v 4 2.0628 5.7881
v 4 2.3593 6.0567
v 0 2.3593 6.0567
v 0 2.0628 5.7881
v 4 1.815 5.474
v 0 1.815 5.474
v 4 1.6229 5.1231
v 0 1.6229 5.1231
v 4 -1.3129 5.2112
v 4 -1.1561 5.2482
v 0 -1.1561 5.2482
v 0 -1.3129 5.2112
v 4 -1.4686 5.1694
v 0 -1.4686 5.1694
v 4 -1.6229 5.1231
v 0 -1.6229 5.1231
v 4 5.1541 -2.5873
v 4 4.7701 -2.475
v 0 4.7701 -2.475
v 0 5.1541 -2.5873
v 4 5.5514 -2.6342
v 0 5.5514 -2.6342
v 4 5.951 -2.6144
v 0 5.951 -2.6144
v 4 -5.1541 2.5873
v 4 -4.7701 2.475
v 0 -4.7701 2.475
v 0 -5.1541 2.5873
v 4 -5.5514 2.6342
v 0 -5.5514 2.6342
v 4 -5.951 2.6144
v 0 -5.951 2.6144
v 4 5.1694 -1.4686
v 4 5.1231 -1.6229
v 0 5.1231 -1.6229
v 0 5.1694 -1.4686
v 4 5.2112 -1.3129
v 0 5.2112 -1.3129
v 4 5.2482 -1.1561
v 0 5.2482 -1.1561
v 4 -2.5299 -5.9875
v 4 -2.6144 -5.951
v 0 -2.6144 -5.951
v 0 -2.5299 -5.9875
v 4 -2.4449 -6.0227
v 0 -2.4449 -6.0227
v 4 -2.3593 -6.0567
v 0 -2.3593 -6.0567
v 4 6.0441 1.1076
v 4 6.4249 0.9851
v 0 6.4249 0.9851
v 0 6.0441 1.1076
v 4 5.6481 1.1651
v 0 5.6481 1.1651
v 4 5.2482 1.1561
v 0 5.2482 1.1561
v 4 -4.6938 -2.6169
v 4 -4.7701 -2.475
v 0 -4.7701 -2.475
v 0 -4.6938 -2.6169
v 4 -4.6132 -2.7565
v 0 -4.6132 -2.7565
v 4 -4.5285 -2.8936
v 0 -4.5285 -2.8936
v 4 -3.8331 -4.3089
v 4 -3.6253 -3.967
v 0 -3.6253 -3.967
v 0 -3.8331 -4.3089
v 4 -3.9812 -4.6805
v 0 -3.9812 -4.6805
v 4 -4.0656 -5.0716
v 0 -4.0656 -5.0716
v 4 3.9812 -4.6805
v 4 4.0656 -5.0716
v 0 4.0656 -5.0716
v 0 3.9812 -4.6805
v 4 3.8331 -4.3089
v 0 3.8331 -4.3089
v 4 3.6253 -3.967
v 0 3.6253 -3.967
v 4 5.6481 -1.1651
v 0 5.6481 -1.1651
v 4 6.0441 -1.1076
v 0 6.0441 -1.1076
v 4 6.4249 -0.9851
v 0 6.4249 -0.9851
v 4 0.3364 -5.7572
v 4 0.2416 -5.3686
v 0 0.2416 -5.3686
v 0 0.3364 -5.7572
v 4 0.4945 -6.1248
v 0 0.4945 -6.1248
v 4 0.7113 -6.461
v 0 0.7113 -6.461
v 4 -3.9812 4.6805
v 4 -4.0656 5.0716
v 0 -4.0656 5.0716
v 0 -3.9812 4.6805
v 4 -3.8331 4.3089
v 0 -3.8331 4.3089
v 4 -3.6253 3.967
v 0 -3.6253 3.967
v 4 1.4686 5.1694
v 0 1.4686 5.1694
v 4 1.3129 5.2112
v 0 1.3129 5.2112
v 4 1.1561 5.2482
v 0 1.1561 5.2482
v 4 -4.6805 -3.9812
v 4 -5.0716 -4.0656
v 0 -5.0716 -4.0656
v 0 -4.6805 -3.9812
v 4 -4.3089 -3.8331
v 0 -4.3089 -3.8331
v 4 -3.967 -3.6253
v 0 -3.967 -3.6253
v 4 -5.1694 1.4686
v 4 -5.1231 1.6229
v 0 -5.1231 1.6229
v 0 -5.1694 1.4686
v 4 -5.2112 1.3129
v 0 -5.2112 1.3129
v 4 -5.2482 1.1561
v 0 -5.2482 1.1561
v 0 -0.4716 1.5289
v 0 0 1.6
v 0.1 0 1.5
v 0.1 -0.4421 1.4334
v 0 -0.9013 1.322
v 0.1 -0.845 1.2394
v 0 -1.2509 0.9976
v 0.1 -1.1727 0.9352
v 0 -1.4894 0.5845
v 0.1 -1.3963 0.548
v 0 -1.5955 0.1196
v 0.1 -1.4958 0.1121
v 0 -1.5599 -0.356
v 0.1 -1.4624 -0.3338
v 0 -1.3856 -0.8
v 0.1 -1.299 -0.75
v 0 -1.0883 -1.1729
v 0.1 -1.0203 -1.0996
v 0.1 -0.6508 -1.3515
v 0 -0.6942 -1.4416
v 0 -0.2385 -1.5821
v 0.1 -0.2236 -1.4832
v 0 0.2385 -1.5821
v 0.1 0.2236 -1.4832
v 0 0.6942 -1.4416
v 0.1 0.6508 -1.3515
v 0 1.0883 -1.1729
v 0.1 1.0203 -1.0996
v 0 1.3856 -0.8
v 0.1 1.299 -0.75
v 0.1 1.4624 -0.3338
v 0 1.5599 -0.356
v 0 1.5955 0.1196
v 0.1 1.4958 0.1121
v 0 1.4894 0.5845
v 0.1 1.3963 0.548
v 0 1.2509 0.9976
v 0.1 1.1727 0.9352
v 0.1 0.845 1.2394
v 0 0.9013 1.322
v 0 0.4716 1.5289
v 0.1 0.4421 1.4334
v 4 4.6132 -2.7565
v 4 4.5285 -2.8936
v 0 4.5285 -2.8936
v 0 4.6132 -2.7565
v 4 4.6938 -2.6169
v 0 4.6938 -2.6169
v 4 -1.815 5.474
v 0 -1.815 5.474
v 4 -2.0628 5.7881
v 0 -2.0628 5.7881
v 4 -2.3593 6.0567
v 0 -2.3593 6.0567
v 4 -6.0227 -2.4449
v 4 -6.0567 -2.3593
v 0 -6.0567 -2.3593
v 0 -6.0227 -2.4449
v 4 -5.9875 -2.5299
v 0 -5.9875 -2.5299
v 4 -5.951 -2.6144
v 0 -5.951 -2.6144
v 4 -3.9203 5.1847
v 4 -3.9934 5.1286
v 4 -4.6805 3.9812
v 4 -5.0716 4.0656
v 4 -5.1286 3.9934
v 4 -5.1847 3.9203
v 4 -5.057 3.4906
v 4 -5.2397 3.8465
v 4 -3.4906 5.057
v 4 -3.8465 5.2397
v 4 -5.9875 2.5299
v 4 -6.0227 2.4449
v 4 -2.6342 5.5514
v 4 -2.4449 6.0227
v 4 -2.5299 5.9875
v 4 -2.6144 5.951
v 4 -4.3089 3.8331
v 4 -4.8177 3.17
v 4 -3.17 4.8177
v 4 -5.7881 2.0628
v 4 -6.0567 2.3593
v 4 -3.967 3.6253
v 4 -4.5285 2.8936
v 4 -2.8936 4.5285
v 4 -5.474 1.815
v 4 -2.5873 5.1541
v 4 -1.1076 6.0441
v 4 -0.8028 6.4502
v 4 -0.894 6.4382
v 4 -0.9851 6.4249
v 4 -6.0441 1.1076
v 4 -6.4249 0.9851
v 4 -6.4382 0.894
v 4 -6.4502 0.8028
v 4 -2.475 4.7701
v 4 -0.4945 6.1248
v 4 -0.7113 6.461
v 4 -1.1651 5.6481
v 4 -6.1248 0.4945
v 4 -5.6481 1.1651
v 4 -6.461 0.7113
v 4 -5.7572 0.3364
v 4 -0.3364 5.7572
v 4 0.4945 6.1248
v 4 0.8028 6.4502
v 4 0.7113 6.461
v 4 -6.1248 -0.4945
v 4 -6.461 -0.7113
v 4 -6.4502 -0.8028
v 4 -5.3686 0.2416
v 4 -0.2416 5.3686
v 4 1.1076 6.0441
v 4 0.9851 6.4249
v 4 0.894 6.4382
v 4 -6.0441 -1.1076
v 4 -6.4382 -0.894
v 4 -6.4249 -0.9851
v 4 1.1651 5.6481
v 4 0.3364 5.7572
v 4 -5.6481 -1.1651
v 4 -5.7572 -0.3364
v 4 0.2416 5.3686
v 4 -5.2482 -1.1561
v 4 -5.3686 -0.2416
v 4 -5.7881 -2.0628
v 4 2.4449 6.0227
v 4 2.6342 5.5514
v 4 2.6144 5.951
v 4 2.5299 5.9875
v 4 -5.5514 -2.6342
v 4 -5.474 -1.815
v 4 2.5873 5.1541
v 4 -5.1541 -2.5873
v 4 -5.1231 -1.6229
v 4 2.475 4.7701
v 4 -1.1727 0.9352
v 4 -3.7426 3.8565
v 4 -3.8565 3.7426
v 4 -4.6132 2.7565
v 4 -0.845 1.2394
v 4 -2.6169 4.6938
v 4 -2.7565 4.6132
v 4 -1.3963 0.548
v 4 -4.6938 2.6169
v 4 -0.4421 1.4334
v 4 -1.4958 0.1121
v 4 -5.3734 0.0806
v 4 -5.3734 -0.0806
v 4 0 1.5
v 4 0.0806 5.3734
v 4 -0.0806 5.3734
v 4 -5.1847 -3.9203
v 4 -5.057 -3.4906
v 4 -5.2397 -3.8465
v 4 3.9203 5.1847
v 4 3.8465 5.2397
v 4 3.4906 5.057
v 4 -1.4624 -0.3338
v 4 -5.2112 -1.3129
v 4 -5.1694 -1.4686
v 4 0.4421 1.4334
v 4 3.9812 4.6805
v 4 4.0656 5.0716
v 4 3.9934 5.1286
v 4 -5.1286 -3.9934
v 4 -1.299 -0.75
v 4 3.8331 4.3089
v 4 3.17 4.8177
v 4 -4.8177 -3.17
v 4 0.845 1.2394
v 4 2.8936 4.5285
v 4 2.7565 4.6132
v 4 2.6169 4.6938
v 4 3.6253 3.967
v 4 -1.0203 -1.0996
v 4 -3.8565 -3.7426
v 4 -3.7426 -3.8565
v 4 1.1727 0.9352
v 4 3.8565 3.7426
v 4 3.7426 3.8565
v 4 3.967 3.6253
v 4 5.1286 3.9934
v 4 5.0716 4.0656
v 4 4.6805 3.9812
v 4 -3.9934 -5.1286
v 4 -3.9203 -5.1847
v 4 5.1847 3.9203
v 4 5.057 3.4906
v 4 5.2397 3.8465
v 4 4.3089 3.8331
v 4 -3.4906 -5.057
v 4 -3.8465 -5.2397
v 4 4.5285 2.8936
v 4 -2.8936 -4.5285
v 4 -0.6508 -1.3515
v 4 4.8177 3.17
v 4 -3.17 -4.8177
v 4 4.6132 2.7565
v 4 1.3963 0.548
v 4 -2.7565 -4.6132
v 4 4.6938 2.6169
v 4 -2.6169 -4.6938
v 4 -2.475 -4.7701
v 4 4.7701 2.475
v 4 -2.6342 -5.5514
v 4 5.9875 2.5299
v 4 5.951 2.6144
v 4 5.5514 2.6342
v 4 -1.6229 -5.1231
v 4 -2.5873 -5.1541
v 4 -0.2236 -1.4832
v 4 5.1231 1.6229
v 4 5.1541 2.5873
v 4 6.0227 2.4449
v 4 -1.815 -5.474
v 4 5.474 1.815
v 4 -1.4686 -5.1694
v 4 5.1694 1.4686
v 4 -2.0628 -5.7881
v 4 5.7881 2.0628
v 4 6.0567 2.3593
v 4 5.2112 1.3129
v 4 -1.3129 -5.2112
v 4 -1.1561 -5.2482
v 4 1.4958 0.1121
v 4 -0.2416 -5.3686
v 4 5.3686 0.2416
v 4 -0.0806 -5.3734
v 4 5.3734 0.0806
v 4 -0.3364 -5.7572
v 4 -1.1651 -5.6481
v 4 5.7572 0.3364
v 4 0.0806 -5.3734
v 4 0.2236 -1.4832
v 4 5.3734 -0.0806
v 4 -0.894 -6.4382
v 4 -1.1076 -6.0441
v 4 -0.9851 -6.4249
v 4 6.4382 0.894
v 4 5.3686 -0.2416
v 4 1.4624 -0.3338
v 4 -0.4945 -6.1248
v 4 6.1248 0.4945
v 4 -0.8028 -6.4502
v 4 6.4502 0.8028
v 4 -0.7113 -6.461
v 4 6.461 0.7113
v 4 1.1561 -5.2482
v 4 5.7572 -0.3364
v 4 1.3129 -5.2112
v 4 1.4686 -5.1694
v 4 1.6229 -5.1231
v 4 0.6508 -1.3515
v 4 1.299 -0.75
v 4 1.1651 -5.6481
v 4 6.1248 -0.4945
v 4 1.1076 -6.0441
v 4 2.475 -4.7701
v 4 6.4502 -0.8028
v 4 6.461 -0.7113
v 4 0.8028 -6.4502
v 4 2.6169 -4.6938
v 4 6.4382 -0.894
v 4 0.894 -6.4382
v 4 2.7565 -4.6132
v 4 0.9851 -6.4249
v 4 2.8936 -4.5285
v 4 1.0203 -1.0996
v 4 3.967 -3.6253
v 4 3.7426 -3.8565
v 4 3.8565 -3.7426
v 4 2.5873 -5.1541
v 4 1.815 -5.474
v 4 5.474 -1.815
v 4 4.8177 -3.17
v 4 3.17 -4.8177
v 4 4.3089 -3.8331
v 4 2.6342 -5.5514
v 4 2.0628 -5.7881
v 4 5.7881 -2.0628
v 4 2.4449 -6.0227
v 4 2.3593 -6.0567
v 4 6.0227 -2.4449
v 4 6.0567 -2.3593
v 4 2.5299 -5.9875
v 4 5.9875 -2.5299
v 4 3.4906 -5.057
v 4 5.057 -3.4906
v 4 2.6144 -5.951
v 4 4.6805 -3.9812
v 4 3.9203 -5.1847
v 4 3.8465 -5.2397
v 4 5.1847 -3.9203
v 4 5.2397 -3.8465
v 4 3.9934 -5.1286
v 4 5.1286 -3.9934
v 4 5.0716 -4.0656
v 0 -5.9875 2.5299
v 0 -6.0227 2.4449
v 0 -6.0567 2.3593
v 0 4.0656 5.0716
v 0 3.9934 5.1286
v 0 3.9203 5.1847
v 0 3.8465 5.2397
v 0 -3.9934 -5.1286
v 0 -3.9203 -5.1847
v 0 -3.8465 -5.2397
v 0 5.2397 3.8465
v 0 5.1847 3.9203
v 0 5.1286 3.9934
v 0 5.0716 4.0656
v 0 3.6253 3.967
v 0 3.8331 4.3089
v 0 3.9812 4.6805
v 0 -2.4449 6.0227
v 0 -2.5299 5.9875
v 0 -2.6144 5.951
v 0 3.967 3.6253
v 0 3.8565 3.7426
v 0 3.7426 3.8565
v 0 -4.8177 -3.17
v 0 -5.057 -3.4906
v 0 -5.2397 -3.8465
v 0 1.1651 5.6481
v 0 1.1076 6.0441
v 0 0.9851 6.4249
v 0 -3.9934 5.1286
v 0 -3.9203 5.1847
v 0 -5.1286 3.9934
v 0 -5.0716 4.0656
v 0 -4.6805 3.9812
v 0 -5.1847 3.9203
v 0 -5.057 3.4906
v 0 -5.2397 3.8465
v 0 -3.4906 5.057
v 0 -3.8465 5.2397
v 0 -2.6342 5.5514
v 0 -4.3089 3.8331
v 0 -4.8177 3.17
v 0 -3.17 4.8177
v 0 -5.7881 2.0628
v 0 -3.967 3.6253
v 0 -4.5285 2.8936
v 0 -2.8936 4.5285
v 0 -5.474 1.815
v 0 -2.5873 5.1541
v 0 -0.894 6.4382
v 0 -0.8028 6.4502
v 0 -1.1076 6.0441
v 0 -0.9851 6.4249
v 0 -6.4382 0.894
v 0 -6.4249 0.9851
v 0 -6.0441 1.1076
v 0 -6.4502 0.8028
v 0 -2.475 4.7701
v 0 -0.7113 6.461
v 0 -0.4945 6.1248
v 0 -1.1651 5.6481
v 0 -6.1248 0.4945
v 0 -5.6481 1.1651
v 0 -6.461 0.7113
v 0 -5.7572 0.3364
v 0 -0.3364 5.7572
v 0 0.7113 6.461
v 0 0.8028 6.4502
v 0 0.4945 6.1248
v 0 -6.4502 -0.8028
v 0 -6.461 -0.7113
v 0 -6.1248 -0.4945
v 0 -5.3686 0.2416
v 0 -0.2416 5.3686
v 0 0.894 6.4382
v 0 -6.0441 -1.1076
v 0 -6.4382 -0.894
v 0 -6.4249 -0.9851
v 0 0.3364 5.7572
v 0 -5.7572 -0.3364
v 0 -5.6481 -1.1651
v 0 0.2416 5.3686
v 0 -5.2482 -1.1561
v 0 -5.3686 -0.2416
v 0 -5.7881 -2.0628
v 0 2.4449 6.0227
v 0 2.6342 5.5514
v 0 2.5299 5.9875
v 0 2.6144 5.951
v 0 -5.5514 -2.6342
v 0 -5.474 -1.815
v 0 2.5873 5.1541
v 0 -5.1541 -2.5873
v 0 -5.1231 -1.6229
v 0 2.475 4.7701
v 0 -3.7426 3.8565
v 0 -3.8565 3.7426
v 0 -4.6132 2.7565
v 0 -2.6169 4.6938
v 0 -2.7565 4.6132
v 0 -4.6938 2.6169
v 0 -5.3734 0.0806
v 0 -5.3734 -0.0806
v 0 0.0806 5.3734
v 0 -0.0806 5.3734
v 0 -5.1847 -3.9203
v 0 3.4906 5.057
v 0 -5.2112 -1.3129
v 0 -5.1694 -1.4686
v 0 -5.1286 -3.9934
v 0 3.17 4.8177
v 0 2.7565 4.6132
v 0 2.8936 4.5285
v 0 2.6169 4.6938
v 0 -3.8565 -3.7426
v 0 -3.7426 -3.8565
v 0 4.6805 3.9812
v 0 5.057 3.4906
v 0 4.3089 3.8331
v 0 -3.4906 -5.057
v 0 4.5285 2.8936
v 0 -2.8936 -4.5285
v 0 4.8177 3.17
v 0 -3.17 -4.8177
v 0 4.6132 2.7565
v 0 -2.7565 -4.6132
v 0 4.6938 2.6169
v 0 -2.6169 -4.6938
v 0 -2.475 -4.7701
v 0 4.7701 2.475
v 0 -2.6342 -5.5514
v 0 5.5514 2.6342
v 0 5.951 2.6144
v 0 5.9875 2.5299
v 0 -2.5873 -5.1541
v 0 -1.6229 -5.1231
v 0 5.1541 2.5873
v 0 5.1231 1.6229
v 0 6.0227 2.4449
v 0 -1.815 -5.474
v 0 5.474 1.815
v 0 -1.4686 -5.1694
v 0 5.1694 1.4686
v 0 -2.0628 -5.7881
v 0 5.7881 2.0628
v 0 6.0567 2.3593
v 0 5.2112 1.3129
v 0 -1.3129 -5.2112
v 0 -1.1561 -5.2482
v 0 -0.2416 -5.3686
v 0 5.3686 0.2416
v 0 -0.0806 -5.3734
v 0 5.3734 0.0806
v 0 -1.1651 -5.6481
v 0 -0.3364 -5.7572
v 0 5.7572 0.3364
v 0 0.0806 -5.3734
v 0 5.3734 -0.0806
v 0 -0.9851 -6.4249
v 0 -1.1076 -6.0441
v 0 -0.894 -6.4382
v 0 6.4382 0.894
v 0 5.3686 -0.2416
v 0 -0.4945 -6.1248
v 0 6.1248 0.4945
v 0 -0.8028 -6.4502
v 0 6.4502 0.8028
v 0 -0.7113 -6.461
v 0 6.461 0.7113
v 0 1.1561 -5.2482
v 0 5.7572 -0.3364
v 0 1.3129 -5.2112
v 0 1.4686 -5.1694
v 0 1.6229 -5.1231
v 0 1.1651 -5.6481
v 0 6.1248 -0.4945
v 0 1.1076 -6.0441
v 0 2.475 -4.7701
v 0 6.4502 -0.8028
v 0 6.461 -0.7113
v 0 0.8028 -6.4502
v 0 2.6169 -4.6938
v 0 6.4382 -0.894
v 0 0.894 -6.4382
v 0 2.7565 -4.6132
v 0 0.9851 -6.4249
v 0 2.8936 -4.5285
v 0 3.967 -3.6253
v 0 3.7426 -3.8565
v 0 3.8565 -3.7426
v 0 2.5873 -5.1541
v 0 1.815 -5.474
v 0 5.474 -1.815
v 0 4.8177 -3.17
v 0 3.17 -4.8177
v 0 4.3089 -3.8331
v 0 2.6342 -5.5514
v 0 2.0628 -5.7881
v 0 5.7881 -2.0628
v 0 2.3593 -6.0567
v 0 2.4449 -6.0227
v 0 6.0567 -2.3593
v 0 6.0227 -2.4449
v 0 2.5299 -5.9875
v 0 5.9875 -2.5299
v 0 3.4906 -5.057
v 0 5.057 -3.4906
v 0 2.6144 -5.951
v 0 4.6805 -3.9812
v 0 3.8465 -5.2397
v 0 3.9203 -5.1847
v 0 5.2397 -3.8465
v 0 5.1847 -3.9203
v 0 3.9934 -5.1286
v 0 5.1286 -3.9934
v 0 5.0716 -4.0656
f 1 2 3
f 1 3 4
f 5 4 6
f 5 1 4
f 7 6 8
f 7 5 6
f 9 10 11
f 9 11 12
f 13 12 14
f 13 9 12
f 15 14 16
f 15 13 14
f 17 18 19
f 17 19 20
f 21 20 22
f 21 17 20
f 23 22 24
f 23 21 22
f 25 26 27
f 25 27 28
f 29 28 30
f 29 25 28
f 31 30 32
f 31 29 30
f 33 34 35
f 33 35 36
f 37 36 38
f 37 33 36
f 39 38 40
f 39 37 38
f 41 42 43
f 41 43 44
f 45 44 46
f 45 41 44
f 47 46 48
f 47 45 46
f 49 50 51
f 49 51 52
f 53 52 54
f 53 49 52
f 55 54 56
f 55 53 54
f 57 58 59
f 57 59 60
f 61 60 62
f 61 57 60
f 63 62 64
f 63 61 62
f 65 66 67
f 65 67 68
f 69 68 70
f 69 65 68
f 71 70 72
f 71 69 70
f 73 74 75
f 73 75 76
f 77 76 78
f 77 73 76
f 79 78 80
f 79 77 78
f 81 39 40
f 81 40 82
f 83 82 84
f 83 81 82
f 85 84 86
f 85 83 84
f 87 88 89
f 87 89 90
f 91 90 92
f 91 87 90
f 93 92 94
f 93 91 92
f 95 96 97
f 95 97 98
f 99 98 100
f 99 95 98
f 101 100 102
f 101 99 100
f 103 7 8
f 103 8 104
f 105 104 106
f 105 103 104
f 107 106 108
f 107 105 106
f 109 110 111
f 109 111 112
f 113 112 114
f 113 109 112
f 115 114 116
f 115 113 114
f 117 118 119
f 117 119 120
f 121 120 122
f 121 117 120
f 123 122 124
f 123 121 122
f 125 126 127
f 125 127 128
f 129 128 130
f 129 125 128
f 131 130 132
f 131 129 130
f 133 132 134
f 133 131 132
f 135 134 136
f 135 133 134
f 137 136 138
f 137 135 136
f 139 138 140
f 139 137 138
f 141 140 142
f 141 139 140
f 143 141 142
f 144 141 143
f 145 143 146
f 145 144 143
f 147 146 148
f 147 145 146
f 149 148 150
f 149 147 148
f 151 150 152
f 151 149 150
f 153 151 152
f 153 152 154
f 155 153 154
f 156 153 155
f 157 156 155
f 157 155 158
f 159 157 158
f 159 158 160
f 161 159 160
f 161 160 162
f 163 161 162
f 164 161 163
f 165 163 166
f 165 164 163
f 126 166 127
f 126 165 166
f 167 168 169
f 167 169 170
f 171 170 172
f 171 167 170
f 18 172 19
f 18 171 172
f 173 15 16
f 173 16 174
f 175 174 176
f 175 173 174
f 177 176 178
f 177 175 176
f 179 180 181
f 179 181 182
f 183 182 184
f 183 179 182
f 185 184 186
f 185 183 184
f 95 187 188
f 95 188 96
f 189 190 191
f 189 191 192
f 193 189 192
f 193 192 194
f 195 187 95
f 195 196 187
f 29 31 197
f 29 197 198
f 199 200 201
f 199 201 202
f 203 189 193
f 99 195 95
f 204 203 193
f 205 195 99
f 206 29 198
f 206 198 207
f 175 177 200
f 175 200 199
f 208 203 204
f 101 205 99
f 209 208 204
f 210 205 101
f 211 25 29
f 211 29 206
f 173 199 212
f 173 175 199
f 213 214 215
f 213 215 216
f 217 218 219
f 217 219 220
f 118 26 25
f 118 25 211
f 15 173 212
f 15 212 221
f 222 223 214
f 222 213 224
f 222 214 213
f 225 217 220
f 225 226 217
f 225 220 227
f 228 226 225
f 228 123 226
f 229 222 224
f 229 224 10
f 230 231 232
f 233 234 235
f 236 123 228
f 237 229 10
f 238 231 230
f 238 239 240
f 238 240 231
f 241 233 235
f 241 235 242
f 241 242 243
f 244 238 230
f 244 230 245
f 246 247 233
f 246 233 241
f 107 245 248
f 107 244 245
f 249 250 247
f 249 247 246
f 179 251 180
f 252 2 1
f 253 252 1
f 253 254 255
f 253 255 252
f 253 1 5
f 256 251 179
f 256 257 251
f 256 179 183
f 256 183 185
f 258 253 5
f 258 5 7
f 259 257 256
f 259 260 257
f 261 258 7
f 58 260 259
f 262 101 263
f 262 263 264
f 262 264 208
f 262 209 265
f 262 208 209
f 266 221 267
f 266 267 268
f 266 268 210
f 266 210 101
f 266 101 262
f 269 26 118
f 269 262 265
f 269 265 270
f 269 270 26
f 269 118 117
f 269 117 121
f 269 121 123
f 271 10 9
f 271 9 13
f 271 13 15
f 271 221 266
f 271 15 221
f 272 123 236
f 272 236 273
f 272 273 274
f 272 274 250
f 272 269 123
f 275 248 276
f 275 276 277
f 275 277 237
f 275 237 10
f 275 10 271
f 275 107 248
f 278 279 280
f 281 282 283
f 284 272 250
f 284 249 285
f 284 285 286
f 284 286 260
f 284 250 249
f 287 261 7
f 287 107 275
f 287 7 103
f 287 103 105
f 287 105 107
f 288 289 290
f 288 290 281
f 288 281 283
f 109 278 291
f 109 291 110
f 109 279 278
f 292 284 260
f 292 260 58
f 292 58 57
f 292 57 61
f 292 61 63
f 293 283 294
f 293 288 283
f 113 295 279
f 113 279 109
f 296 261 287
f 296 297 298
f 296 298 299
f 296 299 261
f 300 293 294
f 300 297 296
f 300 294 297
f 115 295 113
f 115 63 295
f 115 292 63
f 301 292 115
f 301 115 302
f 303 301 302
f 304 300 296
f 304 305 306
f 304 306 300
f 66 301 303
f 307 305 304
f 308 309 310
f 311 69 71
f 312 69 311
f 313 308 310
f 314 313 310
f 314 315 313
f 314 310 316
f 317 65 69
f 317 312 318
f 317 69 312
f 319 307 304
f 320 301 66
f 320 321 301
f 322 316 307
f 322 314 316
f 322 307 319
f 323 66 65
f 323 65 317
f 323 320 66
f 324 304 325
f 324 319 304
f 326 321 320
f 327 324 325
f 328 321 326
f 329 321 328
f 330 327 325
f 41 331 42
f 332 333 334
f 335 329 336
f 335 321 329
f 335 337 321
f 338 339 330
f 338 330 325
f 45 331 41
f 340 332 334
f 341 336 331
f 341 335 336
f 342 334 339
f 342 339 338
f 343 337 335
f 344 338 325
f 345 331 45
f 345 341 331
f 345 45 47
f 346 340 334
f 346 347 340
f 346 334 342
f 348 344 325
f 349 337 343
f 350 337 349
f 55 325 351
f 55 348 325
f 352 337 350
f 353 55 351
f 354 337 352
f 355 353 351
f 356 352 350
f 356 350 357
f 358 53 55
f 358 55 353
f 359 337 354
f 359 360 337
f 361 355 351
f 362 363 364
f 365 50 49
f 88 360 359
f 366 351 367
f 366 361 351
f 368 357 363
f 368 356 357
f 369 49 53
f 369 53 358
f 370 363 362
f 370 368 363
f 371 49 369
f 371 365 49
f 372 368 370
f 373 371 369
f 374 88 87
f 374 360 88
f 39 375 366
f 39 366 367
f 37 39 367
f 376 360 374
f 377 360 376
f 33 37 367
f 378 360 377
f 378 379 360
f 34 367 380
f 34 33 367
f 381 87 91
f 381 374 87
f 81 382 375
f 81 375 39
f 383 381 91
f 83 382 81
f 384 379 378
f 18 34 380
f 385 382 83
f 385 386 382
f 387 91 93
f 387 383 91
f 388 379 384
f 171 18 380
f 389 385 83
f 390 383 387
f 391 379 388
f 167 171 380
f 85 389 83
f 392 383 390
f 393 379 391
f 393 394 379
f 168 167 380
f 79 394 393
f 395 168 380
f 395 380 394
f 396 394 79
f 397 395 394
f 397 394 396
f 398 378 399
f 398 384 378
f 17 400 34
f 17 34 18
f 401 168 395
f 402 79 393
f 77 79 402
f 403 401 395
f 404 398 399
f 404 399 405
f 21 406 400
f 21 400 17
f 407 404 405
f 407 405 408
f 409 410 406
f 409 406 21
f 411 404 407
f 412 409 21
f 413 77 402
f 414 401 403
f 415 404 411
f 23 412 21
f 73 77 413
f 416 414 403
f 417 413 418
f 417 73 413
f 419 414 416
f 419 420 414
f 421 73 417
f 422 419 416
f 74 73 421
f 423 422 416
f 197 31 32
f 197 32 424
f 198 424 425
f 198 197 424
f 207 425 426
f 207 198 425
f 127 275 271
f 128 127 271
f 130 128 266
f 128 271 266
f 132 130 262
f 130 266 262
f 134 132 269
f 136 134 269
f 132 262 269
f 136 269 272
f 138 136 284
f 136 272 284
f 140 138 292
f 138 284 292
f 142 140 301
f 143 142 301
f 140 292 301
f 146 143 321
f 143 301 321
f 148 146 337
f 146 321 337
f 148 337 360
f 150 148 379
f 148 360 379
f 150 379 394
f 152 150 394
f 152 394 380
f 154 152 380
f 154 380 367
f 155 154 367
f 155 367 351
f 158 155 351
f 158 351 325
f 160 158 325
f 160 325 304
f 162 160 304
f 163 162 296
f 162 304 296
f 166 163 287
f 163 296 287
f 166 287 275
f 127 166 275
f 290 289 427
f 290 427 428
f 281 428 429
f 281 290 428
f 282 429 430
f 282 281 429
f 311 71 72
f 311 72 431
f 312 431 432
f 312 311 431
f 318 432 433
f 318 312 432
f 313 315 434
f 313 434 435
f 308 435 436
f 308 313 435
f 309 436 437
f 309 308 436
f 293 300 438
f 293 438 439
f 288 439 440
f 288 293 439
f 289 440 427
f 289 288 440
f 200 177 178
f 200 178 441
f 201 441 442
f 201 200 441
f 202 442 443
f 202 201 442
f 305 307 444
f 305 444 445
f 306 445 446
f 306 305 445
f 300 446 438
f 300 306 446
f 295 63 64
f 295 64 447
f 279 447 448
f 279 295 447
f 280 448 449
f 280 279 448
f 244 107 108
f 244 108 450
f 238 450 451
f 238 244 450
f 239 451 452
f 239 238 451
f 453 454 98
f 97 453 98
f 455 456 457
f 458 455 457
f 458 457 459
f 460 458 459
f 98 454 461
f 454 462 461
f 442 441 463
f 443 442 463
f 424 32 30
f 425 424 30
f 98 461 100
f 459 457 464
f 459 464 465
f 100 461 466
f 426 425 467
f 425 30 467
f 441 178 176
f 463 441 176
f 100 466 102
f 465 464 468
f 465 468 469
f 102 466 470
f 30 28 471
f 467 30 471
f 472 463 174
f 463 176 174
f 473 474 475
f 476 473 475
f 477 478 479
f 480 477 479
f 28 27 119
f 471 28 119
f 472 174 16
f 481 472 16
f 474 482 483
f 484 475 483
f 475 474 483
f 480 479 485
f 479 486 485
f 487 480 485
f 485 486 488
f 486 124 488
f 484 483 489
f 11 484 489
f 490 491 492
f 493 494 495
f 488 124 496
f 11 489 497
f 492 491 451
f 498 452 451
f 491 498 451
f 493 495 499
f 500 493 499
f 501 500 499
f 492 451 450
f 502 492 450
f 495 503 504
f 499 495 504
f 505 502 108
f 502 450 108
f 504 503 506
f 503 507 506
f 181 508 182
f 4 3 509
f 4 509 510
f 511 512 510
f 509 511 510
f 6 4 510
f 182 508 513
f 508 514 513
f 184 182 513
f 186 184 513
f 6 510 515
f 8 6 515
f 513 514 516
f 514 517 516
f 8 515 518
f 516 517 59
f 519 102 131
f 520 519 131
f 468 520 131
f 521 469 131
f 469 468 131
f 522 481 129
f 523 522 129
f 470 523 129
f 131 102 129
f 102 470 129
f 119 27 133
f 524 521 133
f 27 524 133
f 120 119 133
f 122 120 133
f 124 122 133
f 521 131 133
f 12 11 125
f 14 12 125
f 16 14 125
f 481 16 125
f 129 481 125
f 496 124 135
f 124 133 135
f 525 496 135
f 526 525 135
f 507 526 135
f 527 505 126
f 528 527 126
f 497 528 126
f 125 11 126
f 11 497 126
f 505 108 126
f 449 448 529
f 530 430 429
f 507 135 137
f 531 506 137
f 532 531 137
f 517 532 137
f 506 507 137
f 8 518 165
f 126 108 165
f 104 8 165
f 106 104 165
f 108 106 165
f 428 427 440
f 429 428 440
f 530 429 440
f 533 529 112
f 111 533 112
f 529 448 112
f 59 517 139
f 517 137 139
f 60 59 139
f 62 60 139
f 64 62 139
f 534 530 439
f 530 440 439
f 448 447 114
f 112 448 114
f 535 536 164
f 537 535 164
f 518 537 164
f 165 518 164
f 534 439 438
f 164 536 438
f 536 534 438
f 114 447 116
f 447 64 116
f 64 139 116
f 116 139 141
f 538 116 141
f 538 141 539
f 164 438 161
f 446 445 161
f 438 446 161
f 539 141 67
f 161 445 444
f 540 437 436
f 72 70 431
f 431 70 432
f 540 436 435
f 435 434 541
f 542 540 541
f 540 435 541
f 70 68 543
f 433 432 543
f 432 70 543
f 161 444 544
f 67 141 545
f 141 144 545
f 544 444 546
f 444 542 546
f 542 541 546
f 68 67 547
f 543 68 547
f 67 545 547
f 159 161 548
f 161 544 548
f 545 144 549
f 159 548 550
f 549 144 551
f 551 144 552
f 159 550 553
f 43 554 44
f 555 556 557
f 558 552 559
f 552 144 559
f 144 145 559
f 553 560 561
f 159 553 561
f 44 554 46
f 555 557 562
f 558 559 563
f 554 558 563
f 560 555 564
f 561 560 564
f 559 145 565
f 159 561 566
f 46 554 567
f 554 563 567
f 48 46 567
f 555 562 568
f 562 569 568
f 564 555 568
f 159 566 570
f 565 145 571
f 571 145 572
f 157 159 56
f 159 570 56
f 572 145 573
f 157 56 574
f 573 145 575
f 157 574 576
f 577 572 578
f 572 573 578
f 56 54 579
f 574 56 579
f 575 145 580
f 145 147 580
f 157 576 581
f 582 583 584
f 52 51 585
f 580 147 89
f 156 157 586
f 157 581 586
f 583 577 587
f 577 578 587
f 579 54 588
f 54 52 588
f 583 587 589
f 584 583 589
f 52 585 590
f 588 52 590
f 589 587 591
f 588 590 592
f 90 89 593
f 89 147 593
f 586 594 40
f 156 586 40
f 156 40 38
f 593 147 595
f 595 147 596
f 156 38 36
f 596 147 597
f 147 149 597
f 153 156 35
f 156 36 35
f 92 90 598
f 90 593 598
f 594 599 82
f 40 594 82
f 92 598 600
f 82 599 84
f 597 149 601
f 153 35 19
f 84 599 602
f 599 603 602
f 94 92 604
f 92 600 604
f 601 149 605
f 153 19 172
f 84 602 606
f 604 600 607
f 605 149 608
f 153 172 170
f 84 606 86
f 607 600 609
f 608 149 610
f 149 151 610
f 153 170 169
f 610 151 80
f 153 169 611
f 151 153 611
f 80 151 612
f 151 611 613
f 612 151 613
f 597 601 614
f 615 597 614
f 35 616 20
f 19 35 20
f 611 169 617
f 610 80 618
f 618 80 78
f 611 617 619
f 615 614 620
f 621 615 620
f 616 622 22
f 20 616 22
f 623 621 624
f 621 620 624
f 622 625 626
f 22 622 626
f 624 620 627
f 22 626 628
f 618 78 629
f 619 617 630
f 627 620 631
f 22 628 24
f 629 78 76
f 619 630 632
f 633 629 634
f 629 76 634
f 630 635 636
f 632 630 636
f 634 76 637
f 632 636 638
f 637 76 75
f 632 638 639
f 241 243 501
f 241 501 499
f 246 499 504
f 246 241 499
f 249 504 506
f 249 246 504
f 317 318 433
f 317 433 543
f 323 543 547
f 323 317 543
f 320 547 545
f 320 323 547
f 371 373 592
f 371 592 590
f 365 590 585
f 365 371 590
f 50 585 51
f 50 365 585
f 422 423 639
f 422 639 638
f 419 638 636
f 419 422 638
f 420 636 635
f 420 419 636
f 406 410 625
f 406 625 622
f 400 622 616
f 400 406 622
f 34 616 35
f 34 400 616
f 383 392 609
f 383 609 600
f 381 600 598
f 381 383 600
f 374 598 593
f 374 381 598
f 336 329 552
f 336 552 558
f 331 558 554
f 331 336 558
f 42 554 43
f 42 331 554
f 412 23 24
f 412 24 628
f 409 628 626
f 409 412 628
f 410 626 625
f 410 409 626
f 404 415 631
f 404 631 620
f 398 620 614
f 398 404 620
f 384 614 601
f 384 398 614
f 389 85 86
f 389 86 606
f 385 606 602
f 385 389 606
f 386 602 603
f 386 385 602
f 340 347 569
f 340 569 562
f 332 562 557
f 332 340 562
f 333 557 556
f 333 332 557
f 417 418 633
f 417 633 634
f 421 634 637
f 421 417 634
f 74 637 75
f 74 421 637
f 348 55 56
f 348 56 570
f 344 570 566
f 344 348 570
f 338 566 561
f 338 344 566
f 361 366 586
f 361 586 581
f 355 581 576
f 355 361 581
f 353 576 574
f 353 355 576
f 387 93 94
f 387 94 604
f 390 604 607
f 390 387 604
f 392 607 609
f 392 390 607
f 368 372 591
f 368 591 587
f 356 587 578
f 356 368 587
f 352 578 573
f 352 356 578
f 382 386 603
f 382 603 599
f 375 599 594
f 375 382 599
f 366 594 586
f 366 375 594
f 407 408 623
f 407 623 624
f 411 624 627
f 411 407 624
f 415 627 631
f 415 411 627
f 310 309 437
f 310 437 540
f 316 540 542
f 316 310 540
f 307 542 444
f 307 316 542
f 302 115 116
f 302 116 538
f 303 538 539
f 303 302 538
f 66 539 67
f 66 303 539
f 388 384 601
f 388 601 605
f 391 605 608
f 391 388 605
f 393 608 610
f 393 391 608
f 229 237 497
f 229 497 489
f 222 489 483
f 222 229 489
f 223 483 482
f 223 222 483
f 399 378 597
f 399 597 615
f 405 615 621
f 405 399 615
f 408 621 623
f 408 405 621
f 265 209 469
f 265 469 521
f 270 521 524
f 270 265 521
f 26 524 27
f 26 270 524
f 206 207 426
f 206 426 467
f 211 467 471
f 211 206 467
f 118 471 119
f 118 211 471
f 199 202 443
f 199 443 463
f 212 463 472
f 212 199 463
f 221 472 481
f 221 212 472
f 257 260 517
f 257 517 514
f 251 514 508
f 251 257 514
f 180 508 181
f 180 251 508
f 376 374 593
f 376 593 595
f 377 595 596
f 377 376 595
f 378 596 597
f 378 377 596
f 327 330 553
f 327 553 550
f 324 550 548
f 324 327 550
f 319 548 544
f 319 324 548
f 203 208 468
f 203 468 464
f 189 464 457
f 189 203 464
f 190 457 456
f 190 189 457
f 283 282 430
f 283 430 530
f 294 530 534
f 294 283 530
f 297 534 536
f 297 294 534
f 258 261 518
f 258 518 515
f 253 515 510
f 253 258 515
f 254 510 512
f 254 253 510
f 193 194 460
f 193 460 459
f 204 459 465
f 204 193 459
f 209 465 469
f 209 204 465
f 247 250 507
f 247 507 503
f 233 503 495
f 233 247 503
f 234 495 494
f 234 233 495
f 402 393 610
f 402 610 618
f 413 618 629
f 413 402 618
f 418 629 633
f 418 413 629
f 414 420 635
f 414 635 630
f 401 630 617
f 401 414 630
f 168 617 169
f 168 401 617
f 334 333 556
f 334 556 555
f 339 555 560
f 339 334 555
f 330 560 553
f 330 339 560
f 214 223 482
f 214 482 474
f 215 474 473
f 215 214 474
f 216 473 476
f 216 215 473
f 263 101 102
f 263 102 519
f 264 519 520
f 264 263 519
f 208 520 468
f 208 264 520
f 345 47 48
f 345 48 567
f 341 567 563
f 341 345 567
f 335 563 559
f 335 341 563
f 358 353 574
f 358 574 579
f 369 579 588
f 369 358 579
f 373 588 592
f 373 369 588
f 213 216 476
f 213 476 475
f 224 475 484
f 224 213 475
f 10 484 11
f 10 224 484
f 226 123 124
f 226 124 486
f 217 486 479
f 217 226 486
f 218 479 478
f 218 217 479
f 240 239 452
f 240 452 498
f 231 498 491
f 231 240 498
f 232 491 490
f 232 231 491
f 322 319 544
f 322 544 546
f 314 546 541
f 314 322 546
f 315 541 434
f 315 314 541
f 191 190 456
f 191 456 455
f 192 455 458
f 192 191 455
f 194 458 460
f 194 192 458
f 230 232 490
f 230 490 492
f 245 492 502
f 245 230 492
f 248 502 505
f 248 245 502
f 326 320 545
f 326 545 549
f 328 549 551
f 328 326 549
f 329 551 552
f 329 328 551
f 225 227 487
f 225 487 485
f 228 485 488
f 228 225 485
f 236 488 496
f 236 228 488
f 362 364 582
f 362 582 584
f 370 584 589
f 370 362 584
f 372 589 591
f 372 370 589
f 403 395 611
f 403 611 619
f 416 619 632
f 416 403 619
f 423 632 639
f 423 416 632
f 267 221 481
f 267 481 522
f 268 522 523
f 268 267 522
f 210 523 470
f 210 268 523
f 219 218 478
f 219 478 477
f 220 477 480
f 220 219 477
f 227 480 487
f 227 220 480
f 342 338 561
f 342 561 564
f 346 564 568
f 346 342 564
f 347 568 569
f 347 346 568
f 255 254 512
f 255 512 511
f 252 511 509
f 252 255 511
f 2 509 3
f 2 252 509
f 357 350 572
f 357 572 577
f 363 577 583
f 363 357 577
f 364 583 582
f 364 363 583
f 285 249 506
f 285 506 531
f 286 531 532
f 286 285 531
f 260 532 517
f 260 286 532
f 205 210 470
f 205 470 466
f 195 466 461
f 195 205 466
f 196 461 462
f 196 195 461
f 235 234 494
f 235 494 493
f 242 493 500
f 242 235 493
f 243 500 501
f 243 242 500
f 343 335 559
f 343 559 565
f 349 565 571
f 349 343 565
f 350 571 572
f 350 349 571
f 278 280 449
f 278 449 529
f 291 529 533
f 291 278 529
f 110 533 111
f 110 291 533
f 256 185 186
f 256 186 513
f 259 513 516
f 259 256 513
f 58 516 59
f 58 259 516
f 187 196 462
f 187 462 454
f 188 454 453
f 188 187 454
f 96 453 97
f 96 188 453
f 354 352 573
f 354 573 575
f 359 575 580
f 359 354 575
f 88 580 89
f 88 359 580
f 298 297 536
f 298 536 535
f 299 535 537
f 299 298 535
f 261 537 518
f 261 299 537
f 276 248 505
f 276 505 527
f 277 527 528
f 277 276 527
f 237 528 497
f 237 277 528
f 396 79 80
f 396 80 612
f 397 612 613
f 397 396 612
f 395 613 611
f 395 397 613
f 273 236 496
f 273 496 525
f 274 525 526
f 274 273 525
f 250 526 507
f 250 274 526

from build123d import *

# Parameters (mm, degrees)
SKETCH_1_R      = 1.5
EXTRUDE_1_DEPTH = 4
CHAMFER_1_SIZE  = 0.1


with BuildPart() as part:
    # 草图1 → 凸台-拉伸1 (new body)
    with BuildSketch(Plane(origin=(4, 0, 0), x_dir=(0, 0, -1), z_dir=(1, 0, 0))):
        with BuildLine():
            ThreePointArc((-5.368564348, 0.241646108), (-5.374, 0), (-5.368564348, -0.241646108))
            ThreePointArc((-5.368564348, -0.241646108), (-5.94431135, -0.407766737), (-6.460959589, -0.711337602))
            ThreePointArc((-6.460959589, -0.711337602), (-6.444391599, -0.848420249), (-6.424915449, -0.98512003))
            ThreePointArc((-6.424915449, -0.98512003), (-5.84730165, -1.144628565), (-5.248177569, -1.156074481))
            ThreePointArc((-5.248177569, -1.156074481), (-5.19088539, -1.390893548), (-5.123092339, -1.622898915))
            ThreePointArc((-5.123092339, -1.622898915), (-5.636226055, -1.93237341), (-6.056700011, -2.359318752))
            ThreePointArc((-6.056700011, -2.359318752), (-6.005216961, -2.48744231), (-5.951023938, -2.614443361))
            ThreePointArc((-5.951023938, -2.614443361), (-5.351808006, -2.619019322), (-4.770136161, -2.475010506))
            ThreePointArc((-4.770136161, -2.475010506), (-4.65402052, -2.687), (-4.528490053, -2.893553842))
            ThreePointArc((-4.528490053, -2.893553842), (-4.944041268, -3.325292028), (-5.239686336, -3.846516229))
            ThreePointArc((-5.239686336, -3.846516229), (-5.156796712, -3.956949289), (-5.071579981, -4.065596697))
            ThreePointArc((-5.071579981, -4.065596697), (-4.49159749, -3.91492824), (-3.967017857, -3.625278654))
            ThreePointArc((-3.967017857, -3.625278654), (-3.799991842, -3.799991842), (-3.625278654, -3.967017857))
            ThreePointArc((-3.625278654, -3.967017857), (-3.91492824, -4.49159749), (-4.065596697, -5.071579981))
            ThreePointArc((-4.065596697, -5.071579981), (-3.956949289, -5.156796712), (-3.846516229, -5.239686336))
            ThreePointArc((-3.846516229, -5.239686336), (-3.325292028, -4.944041268), (-2.893553842, -4.528490053))
            ThreePointArc((-2.893553842, -4.528490053), (-2.687, -4.65402052), (-2.475010506, -4.770136161))
            ThreePointArc((-2.475010506, -4.770136161), (-2.619019322, -5.351808006), (-2.614443361, -5.951023938))
            ThreePointArc((-2.614443361, -5.951023938), (-2.48744231, -6.005216961), (-2.359318752, -6.056700011))
            ThreePointArc((-2.359318752, -6.056700011), (-1.93237341, -5.636226055), (-1.622898915, -5.123092339))
            ThreePointArc((-1.622898915, -5.123092339), (-1.390893548, -5.19088539), (-1.156074481, -5.248177569))
            ThreePointArc((-1.156074481, -5.248177569), (-1.144628565, -5.84730165), (-0.98512003, -6.424915449))
            ThreePointArc((-0.98512003, -6.424915449), (-0.848420249, -6.444391599), (-0.711337602, -6.460959589))
            ThreePointArc((-0.711337602, -6.460959589), (-0.407766737, -5.94431135), (-0.241646108, -5.368564348))
            ThreePointArc((-0.241646108, -5.368564348), (0, -5.374), (0.241646108, -5.368564348))
            ThreePointArc((0.241646108, -5.368564348), (0.407766737, -5.94431135), (0.711337602, -6.460959589))
            ThreePointArc((0.711337602, -6.460959589), (0.848420249, -6.444391599), (0.98512003, -6.424915449))
            ThreePointArc((0.98512003, -6.424915449), (1.144628565, -5.84730165), (1.156074481, -5.248177569))
            ThreePointArc((1.156074481, -5.248177569), (1.390893548, -5.19088539), (1.622898915, -5.123092339))
            ThreePointArc((1.622898915, -5.123092339), (1.93237341, -5.636226055), (2.359318752, -6.056700011))
            ThreePointArc((2.359318752, -6.056700011), (2.48744231, -6.005216961), (2.614443361, -5.951023938))
            ThreePointArc((2.614443361, -5.951023938), (2.619019322, -5.351808006), (2.475010506, -4.770136161))
            ThreePointArc((2.475010506, -4.770136161), (2.687, -4.65402052), (2.893553842, -4.528490053))
            ThreePointArc((2.893553842, -4.528490053), (3.325292028, -4.944041268), (3.846516229, -5.239686336))
            ThreePointArc((3.846516229, -5.239686336), (3.956949289, -5.156796712), (4.065596697, -5.071579981))
            ThreePointArc((4.065596697, -5.071579981), (3.91492824, -4.49159749), (3.625278654, -3.967017857))
            ThreePointArc((3.625278654, -3.967017857), (3.799991842, -3.799991842), (3.967017857, -3.625278654))
            ThreePointArc((3.967017857, -3.625278654), (4.49159749, -3.91492824), (5.071579981, -4.065596697))
            ThreePointArc((5.071579981, -4.065596697), (5.156796712, -3.956949289), (5.239686336, -3.846516229))
            ThreePointArc((5.239686336, -3.846516229), (4.944041268, -3.325292028), (4.528490053, -2.893553842))
            ThreePointArc((4.528490053, -2.893553842), (4.65402052, -2.687), (4.770136161, -2.475010506))
            ThreePointArc((4.770136161, -2.475010506), (5.351808006, -2.619019322), (5.951023938, -2.614443361))
            ThreePointArc((5.951023938, -2.614443361), (6.005216961, -2.48744231), (6.056700011, -2.359318752))
            ThreePointArc((6.056700011, -2.359318752), (5.636226055, -1.93237341), (5.123092339, -1.622898915))
            ThreePointArc((5.123092339, -1.622898915), (5.19088539, -1.390893548), (5.248177569, -1.156074481))
            ThreePointArc((5.248177569, -1.156074481), (5.84730165, -1.144628565), (6.424915449, -0.98512003))
            ThreePointArc((6.424915449, -0.98512003), (6.444391599, -0.848420249), (6.460959589, -0.711337602))
            ThreePointArc((6.460959589, -0.711337602), (5.94431135, -0.407766737), (5.368564348, -0.241646108))
            ThreePointArc((5.368564348, -0.241646108), (5.374, 0), (5.368564348, 0.241646108))
            ThreePointArc((5.368564348, 0.241646108), (5.94431135, 0.407766737), (6.460959589, 0.711337602))
            ThreePointArc((6.460959589, 0.711337602), (6.444391599, 0.848420249), (6.424915449, 0.98512003))
            ThreePointArc((6.424915449, 0.98512003), (5.84730165, 1.144628565), (5.248177569, 1.156074481))
            ThreePointArc((5.248177569, 1.156074481), (5.19088539, 1.390893548), (5.123092339, 1.622898915))
            ThreePointArc((5.123092339, 1.622898915), (5.636226055, 1.93237341), (6.056700011, 2.359318752))
            ThreePointArc((6.056700011, 2.359318752), (6.005216961, 2.48744231), (5.951023938, 2.614443361))
            ThreePointArc((5.951023938, 2.614443361), (5.351808006, 2.619019322), (4.770136161, 2.475010506))
            ThreePointArc((4.770136161, 2.475010506), (4.65402052, 2.687), (4.528490053, 2.893553842))
            ThreePointArc((4.528490053, 2.893553842), (4.944041268, 3.325292028), (5.239686336, 3.846516229))
            ThreePointArc((5.239686336, 3.846516229), (5.156796712, 3.956949289), (5.071579981, 4.065596697))
            ThreePointArc((5.071579981, 4.065596697), (4.49159749, 3.91492824), (3.967017857, 3.625278654))
            ThreePointArc((3.967017857, 3.625278654), (3.799991842, 3.799991842), (3.625278654, 3.967017857))
            ThreePointArc((3.625278654, 3.967017857), (3.91492824, 4.49159749), (4.065596697, 5.071579981))
            ThreePointArc((4.065596697, 5.071579981), (3.956949289, 5.156796712), (3.846516229, 5.239686336))
            ThreePointArc((3.846516229, 5.239686336), (3.325292028, 4.944041268), (2.893553842, 4.528490053))
            ThreePointArc((2.893553842, 4.528490053), (2.687, 4.65402052), (2.475010506, 4.770136161))
            ThreePointArc((2.475010506, 4.770136161), (2.619019322, 5.351808006), (2.614443361, 5.951023938))
            ThreePointArc((2.614443361, 5.951023938), (2.48744231, 6.005216961), (2.359318752, 6.056700011))
            ThreePointArc((2.359318752, 6.056700011), (1.93237341, 5.636226055), (1.622898915, 5.123092339))
            ThreePointArc((1.622898915, 5.123092339), (1.390893548, 5.19088539), (1.156074481, 5.248177569))
            ThreePointArc((1.156074481, 5.248177569), (1.144628565, 5.84730165), (0.98512003, 6.424915449))
            ThreePointArc((0.98512003, 6.424915449), (0.848420249, 6.444391599), (0.711337602, 6.460959589))
            ThreePointArc((0.711337602, 6.460959589), (0.407766737, 5.94431135), (0.241646108, 5.368564348))
            ThreePointArc((0.241646108, 5.368564348), (0, 5.374), (-0.241646108, 5.368564348))
            ThreePointArc((-0.241646108, 5.368564348), (-0.407766737, 5.94431135), (-0.711337602, 6.460959589))
            ThreePointArc((-0.711337602, 6.460959589), (-0.848420249, 6.444391599), (-0.98512003, 6.424915449))
            ThreePointArc((-0.98512003, 6.424915449), (-1.144628565, 5.84730165), (-1.156074481, 5.248177569))
            ThreePointArc((-1.156074481, 5.248177569), (-1.390893548, 5.19088539), (-1.622898915, 5.123092339))
            ThreePointArc((-1.622898915, 5.123092339), (-1.93237341, 5.636226055), (-2.359318752, 6.056700011))
            ThreePointArc((-2.359318752, 6.056700011), (-2.48744231, 6.005216961), (-2.614443361, 5.951023938))
            ThreePointArc((-2.614443361, 5.951023938), (-2.619019322, 5.351808006), (-2.475010506, 4.770136161))
            ThreePointArc((-2.475010506, 4.770136161), (-2.687, 4.65402052), (-2.893553842, 4.528490053))
            ThreePointArc((-2.893553842, 4.528490053), (-3.325292028, 4.944041268), (-3.846516229, 5.239686336))
            ThreePointArc((-3.846516229, 5.239686336), (-3.956949289, 5.156796712), (-4.065596697, 5.071579981))
            ThreePointArc((-4.065596697, 5.071579981), (-3.91492824, 4.49159749), (-3.625278654, 3.967017857))
            ThreePointArc((-3.625278654, 3.967017857), (-3.799991842, 3.799991842), (-3.967017857, 3.625278654))
            ThreePointArc((-3.967017857, 3.625278654), (-4.49159749, 3.91492824), (-5.071579981, 4.065596697))
            ThreePointArc((-5.071579981, 4.065596697), (-5.156796712, 3.956949289), (-5.239686336, 3.846516229))
            ThreePointArc((-5.239686336, 3.846516229), (-4.944041268, 3.325292028), (-4.528490053, 2.893553842))
            ThreePointArc((-4.528490053, 2.893553842), (-4.65402052, 2.687), (-4.770136161, 2.475010506))
            ThreePointArc((-4.770136161, 2.475010506), (-5.351808006, 2.619019322), (-5.951023938, 2.614443361))
            ThreePointArc((-5.951023938, 2.614443361), (-6.005216961, 2.48744231), (-6.056700011, 2.359318752))
            ThreePointArc((-6.056700011, 2.359318752), (-5.636226055, 1.93237341), (-5.123092339, 1.622898915))
            ThreePointArc((-5.123092339, 1.622898915), (-5.19088539, 1.390893548), (-5.248177569, 1.156074481))
            ThreePointArc((-5.248177569, 1.156074481), (-5.84730165, 1.144628565), (-6.424915449, 0.98512003))
            ThreePointArc((-6.424915449, 0.98512003), (-6.444391599, 0.848420249), (-6.460959589, 0.711337602))
            ThreePointArc((-6.460959589, 0.711337602), (-5.94431135, 0.407766737), (-5.368564348, 0.241646108))
        make_face()
        with Locations(Location((0, 0, 0), (0, 0, 180))):
            Circle(SKETCH_1_R, mode=Mode.SUBTRACT)
    extrude(amount=-EXTRUDE_1_DEPTH)

    # 倒角1
    chamfer_1_edges = [part.edges().sort_by_distance(p)[0] for p in [
        (0, 0, -1.5),
    ]]
    chamfer(chamfer_1_edges, length=CHAMFER_1_SIZE)


solid = part.part
